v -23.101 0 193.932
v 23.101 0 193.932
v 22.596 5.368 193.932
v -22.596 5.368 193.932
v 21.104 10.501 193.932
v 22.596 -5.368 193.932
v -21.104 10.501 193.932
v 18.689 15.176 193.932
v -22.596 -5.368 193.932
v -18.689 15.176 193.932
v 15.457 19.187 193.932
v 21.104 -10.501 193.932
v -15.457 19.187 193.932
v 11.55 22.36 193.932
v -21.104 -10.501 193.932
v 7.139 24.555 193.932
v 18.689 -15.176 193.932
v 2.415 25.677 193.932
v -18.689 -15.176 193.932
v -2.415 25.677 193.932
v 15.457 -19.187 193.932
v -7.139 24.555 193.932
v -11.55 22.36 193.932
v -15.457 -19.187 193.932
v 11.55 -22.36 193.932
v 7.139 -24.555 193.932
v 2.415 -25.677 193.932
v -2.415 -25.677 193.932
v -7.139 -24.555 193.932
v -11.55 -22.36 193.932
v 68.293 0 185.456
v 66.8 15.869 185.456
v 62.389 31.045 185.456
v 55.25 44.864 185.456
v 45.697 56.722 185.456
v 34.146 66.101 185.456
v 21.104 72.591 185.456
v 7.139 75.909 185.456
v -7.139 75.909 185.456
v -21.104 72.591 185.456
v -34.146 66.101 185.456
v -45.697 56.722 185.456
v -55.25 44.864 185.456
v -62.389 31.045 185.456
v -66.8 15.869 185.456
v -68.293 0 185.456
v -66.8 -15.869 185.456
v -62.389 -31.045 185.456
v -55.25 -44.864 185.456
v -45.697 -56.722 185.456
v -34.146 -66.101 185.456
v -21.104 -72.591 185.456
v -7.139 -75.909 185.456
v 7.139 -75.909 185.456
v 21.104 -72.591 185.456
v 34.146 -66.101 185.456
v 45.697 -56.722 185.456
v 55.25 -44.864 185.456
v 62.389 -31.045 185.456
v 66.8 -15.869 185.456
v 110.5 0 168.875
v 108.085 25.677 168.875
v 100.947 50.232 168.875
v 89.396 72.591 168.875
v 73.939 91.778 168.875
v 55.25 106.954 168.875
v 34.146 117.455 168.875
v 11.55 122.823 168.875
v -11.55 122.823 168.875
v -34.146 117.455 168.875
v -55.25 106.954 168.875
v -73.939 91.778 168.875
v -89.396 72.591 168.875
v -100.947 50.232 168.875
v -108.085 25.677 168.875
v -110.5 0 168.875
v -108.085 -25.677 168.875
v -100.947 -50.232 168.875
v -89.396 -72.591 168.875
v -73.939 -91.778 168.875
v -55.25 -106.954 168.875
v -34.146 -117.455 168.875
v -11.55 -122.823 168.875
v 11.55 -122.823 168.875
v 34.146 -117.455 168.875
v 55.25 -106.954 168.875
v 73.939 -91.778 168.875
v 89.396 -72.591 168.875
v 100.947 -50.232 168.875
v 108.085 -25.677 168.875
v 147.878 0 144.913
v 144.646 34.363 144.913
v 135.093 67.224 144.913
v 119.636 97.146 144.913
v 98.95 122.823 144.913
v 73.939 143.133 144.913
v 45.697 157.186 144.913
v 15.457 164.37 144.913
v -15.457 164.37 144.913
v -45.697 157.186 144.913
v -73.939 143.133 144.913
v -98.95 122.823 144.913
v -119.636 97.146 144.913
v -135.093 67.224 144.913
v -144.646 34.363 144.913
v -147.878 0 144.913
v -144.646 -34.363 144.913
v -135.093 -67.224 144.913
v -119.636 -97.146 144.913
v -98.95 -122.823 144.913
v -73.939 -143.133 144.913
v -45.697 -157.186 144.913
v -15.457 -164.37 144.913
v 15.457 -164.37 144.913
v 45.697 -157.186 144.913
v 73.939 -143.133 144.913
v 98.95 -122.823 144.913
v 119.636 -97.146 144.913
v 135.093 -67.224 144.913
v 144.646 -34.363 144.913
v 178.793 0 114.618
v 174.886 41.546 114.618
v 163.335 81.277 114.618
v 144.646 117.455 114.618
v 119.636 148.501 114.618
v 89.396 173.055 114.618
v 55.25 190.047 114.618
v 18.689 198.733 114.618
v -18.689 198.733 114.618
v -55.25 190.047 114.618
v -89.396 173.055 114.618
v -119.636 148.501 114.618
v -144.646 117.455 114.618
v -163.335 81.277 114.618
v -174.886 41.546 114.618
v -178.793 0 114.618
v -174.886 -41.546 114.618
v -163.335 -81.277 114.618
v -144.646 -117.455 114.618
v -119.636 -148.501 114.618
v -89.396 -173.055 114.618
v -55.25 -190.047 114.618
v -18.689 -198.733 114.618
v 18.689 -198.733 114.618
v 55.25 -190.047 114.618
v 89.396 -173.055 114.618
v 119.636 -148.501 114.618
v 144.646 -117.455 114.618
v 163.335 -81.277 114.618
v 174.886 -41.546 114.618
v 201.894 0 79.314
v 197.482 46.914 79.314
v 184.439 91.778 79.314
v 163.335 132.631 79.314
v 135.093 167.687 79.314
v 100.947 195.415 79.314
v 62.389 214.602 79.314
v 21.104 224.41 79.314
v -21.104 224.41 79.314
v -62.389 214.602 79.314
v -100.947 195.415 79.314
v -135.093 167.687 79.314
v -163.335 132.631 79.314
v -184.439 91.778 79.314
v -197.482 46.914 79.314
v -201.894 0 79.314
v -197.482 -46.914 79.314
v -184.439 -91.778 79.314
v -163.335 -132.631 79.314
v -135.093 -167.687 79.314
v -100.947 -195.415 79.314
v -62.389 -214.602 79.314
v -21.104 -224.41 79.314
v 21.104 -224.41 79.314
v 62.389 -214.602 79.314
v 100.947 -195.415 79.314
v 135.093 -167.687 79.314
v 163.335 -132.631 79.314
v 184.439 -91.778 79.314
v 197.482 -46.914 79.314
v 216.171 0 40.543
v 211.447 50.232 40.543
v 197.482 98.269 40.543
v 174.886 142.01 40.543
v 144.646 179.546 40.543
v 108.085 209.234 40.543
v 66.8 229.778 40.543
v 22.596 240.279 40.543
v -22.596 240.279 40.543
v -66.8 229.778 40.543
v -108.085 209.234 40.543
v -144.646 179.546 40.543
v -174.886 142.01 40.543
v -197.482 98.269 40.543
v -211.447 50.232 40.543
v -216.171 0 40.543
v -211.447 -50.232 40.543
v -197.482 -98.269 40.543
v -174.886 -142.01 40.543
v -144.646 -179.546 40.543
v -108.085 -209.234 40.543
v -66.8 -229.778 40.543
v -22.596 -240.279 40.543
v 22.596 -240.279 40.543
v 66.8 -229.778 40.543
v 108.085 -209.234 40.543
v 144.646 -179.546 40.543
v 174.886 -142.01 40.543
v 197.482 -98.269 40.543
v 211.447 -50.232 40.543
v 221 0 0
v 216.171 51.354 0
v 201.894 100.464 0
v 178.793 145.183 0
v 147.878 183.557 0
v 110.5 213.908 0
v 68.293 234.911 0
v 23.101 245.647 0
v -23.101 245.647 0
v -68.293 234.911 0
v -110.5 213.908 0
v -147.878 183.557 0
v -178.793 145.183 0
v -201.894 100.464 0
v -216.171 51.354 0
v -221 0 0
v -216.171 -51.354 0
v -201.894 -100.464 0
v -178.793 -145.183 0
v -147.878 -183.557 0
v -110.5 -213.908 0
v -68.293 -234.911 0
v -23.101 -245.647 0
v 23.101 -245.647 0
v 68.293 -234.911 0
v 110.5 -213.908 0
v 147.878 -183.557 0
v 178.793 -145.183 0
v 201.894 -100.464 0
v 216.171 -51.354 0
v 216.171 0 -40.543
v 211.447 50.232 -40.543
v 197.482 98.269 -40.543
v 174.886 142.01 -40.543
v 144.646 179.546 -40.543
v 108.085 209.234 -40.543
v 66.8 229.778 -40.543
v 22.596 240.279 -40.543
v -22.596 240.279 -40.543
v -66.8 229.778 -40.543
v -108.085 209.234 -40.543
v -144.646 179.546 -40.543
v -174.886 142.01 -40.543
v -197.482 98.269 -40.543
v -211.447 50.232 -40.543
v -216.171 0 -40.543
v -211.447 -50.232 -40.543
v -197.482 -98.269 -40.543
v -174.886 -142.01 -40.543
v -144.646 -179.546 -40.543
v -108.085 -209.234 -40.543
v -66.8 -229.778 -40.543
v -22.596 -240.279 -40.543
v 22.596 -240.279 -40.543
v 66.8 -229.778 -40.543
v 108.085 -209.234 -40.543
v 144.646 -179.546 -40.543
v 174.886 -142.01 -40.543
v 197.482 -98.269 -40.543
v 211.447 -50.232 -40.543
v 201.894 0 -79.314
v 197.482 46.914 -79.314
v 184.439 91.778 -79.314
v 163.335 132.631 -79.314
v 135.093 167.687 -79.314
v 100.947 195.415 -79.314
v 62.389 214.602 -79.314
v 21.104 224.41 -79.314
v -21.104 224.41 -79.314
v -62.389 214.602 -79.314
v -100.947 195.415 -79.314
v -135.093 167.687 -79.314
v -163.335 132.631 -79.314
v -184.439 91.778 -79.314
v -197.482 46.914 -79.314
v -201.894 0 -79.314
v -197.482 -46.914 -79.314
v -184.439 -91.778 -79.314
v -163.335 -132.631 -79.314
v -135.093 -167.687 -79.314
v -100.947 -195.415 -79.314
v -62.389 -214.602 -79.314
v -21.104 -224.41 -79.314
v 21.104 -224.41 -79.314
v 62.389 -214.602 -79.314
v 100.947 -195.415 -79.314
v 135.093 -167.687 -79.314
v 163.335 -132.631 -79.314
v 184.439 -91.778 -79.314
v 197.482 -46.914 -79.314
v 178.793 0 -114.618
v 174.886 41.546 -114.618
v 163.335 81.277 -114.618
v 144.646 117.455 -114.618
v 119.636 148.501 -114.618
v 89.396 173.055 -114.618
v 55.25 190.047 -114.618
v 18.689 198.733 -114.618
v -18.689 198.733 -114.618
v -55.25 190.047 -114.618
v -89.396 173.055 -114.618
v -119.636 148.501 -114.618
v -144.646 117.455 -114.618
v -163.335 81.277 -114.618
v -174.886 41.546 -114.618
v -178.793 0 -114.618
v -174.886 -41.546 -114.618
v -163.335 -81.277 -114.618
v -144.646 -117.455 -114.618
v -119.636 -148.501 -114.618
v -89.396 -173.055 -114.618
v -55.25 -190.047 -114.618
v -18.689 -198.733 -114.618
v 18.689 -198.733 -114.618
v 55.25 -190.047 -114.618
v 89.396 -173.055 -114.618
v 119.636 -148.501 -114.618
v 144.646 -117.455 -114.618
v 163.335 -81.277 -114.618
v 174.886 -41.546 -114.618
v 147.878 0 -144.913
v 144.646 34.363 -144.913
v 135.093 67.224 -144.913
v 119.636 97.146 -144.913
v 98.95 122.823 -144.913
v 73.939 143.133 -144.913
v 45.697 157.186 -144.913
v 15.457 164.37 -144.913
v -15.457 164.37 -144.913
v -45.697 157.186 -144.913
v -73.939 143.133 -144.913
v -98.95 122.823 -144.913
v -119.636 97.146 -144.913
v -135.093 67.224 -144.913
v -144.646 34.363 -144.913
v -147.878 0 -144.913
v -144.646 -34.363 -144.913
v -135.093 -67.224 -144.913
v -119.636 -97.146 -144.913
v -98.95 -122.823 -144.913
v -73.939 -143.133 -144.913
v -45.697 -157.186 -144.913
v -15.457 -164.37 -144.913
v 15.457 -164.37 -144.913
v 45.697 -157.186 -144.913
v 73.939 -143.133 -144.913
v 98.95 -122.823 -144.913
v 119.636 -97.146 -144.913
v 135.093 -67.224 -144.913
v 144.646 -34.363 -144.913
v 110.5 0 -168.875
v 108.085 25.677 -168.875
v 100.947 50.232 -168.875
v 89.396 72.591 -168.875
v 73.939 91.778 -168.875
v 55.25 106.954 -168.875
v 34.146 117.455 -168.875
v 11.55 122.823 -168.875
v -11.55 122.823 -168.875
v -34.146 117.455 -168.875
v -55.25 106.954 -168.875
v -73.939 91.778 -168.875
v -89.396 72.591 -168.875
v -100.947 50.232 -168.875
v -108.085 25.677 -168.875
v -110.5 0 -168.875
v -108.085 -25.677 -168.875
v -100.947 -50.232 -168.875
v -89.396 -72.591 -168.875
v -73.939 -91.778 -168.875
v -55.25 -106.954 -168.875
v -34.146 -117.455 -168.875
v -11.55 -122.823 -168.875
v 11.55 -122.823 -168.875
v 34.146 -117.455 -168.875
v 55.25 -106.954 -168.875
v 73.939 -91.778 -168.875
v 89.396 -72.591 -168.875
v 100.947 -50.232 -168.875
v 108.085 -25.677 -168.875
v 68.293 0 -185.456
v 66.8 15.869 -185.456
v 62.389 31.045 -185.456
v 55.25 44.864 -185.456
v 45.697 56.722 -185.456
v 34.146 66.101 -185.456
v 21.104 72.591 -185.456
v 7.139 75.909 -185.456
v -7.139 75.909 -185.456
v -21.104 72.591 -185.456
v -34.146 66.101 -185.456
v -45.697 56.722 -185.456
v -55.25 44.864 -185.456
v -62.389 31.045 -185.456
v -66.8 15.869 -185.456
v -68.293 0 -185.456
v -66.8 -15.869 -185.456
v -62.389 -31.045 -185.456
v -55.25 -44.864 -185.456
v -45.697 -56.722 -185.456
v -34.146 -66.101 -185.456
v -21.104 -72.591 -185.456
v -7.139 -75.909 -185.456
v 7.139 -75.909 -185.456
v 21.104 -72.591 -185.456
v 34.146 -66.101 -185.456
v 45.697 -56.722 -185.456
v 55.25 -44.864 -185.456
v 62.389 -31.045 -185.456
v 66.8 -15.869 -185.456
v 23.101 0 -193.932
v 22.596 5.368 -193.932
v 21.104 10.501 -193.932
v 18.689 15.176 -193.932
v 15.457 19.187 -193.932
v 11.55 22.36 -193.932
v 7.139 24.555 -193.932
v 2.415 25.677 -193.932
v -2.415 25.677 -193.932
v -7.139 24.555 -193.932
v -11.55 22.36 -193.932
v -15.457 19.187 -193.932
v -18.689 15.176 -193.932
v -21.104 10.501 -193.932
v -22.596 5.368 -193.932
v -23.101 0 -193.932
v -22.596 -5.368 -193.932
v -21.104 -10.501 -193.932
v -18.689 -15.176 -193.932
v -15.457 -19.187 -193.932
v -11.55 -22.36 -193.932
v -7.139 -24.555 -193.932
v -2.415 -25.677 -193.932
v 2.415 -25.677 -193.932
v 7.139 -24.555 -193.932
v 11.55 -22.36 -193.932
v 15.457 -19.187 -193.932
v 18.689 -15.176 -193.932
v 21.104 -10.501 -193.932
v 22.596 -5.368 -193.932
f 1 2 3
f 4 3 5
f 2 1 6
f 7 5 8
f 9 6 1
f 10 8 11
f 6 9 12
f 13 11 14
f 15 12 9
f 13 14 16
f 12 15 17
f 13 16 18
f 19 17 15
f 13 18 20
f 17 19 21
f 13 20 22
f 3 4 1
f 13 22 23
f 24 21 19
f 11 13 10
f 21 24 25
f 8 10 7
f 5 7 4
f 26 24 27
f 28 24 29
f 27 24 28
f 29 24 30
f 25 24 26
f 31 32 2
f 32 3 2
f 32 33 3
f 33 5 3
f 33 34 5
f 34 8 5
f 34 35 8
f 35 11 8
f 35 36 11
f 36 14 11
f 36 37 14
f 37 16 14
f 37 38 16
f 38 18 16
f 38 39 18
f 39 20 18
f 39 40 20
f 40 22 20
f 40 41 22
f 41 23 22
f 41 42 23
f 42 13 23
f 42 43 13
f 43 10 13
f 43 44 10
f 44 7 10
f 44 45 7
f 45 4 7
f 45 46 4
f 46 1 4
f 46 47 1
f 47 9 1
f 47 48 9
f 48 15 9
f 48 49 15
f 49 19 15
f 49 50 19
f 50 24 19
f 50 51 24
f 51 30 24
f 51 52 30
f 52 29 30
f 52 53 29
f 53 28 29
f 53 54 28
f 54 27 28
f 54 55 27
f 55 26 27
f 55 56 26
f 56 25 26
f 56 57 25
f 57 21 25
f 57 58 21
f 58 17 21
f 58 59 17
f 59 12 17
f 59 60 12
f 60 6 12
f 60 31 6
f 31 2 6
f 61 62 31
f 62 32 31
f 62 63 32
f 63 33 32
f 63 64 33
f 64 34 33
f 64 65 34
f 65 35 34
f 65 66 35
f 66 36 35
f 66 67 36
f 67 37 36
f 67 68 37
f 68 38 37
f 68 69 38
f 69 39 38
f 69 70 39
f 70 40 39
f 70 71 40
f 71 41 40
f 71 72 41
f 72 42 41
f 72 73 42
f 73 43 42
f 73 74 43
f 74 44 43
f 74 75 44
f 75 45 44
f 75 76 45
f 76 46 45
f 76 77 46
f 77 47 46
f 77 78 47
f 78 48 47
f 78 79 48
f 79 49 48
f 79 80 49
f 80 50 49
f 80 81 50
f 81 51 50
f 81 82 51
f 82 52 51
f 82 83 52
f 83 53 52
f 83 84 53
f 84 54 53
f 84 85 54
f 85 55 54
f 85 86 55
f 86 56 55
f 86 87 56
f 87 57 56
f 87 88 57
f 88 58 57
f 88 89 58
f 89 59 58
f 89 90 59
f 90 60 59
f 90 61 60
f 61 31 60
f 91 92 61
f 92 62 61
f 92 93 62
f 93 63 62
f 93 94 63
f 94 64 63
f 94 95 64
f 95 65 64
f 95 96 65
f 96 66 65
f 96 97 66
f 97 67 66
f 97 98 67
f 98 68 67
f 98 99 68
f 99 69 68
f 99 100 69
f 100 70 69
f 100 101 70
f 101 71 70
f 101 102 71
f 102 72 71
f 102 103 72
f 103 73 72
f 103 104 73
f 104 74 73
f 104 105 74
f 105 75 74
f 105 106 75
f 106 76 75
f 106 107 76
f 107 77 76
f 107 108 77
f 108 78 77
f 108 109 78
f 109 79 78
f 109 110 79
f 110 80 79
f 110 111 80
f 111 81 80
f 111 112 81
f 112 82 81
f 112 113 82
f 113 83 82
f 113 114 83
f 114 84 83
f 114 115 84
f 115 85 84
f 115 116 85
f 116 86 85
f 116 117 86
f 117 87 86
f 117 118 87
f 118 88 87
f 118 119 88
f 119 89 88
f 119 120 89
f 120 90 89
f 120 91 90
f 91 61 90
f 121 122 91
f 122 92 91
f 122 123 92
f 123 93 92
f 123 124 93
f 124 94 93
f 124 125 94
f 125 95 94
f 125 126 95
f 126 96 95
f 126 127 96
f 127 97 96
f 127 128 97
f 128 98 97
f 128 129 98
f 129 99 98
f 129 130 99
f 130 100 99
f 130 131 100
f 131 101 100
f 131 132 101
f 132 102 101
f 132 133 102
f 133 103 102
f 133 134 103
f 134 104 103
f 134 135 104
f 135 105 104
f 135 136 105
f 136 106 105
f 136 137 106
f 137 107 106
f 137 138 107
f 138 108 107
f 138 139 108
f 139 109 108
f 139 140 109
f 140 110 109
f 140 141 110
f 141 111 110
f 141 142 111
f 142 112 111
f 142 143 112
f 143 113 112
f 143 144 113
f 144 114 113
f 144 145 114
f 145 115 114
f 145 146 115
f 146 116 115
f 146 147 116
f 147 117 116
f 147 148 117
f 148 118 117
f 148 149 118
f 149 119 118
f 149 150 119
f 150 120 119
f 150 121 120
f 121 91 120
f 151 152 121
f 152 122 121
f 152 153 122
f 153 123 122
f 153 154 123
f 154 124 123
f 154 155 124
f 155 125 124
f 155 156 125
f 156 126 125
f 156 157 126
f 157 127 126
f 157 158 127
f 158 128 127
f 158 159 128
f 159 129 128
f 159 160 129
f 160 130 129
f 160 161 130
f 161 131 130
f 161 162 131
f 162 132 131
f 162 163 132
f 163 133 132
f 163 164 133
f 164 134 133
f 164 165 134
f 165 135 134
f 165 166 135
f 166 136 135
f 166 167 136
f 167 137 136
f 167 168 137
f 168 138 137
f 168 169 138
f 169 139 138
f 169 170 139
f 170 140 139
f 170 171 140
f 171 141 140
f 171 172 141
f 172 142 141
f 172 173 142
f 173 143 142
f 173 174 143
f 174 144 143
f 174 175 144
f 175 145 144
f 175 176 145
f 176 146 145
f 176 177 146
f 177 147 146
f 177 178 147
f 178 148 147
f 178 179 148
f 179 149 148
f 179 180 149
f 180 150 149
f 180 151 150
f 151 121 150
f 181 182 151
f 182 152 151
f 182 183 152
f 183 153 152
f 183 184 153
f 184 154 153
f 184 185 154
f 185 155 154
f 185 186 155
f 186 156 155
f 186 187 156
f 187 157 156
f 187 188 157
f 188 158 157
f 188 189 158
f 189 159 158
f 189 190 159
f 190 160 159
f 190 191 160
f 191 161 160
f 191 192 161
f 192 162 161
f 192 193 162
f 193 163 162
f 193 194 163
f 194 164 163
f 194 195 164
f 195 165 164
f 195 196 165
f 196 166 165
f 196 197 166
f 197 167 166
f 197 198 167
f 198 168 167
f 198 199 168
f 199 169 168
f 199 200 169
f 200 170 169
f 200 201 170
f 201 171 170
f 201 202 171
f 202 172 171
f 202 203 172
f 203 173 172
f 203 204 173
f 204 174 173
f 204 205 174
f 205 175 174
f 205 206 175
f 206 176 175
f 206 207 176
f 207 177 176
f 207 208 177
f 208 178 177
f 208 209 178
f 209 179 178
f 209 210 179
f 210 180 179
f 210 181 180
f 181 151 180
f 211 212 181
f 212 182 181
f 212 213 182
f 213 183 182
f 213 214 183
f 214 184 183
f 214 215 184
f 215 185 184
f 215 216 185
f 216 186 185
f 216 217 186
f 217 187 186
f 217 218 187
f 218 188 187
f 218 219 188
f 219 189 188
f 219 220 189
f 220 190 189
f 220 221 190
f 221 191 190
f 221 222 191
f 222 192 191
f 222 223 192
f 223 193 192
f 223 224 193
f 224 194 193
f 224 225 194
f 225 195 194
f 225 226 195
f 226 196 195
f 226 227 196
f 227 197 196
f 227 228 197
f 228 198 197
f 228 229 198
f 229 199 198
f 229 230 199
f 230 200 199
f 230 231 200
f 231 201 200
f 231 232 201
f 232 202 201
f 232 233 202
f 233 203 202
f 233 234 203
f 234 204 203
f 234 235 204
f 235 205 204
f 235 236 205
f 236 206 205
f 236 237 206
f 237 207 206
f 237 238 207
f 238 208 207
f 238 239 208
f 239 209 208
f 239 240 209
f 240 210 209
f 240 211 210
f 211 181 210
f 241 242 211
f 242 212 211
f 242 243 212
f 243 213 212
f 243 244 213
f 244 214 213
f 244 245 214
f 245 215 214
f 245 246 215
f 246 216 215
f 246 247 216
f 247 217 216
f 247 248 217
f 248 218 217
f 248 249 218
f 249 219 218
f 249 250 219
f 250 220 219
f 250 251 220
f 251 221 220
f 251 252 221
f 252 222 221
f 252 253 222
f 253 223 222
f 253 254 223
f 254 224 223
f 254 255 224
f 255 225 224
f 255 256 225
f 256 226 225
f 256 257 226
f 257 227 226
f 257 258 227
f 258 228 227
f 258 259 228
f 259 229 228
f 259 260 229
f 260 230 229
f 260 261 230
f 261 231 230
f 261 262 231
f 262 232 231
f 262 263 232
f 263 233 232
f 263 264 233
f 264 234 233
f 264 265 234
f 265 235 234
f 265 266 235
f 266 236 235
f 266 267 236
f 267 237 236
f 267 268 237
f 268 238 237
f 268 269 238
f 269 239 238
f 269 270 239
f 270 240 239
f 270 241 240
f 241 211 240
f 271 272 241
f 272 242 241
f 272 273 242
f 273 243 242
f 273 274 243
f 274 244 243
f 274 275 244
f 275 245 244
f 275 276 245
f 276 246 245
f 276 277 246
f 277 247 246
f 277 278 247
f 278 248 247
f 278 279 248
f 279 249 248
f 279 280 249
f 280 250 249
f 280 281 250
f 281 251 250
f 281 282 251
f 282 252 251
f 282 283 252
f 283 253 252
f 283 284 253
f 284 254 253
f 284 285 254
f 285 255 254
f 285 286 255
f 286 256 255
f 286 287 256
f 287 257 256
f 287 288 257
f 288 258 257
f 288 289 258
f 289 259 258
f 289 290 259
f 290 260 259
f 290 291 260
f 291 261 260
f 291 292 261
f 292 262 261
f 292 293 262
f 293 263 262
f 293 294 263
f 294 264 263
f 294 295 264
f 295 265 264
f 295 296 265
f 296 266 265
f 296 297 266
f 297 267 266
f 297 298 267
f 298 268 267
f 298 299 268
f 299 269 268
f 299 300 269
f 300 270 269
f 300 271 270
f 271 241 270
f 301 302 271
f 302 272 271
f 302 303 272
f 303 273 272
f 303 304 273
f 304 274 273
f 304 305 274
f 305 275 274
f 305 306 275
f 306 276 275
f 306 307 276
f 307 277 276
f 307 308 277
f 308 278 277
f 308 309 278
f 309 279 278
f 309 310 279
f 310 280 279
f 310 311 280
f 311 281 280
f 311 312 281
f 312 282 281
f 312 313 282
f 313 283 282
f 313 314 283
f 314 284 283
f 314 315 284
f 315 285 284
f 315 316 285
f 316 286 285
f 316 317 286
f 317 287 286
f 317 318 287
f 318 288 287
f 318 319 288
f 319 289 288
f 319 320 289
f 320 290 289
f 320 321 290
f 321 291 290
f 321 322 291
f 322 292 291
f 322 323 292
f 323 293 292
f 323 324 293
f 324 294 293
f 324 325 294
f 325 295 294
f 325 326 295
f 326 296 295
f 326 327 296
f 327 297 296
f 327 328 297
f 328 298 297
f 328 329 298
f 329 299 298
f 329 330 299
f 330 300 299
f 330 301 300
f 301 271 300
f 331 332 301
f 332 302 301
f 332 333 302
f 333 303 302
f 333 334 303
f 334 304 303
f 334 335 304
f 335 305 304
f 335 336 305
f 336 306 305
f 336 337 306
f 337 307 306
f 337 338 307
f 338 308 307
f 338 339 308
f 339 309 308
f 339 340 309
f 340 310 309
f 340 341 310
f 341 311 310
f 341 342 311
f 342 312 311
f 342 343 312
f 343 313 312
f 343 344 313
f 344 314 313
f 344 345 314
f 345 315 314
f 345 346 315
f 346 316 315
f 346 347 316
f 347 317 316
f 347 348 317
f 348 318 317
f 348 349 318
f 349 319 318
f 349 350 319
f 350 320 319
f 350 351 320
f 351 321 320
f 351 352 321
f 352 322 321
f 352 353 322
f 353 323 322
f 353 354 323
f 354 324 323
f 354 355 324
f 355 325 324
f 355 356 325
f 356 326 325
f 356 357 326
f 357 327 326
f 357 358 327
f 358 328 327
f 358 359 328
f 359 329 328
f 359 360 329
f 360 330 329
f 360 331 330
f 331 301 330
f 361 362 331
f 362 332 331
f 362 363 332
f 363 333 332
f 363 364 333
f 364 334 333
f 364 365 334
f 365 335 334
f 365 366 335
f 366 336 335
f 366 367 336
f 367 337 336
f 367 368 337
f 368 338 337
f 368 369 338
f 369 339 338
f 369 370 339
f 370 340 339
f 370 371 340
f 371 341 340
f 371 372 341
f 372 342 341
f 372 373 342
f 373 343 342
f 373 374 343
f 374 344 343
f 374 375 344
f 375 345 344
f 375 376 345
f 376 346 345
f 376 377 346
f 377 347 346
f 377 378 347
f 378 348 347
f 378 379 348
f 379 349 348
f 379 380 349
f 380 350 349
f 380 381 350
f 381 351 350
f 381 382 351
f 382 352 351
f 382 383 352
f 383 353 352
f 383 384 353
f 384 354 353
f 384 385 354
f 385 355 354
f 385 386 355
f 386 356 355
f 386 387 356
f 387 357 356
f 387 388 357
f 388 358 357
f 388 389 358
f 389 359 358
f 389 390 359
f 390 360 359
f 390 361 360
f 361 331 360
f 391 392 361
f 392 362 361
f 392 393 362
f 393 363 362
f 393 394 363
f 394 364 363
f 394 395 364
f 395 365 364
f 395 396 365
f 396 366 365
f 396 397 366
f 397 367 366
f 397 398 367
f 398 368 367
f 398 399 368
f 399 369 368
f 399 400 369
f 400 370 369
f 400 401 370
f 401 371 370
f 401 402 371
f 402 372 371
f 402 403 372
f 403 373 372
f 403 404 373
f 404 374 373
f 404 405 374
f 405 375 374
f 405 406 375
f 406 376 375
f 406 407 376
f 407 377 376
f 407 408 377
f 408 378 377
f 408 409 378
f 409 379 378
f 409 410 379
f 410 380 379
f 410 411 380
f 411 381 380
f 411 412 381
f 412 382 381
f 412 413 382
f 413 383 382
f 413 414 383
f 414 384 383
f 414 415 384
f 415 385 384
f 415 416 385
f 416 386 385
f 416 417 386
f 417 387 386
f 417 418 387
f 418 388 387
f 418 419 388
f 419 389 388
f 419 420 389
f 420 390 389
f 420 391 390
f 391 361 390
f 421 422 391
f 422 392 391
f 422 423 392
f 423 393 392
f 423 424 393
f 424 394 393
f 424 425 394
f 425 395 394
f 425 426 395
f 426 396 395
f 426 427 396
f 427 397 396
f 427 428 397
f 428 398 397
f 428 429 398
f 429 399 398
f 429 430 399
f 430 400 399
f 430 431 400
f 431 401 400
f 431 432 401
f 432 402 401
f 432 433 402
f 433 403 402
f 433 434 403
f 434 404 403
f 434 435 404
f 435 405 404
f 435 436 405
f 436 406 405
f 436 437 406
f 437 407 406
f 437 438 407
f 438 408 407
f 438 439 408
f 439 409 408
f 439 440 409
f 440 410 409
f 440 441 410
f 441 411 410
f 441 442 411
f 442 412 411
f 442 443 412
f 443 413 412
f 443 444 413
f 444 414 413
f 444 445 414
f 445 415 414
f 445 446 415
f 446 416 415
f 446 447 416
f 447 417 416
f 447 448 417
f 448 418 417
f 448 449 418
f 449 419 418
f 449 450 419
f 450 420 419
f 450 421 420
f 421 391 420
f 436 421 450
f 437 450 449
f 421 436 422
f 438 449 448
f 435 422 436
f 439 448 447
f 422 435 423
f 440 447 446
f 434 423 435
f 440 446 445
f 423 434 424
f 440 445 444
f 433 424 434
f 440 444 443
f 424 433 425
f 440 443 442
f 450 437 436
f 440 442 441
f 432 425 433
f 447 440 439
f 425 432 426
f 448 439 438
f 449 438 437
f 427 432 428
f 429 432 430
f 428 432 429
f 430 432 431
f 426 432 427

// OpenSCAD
// Generated by SolidPython 1.0.1 on 2020-07-29 00:46:53


scale(v = [17, 19, 15]) {
	sphere(r = 13);
}
/***********************************************
*********      SolidPython code:      **********
************************************************
 
# import packages: SolidPython
from solid import *
from solid.utils import *
from itertools import chain, combinations, permutations


class Resize:

    def __init__(self, scad_file):
        self.scad_file = scad_file
        #self.scad_file = import_scad(scad_file)
        # cone/cylinder param:
        self.r1 = 0
        self.r2 = 0
        self.h = 0
        # rectangular prism param:
        self.w = 0
        self.l = 0
        # ellipse param:
        self.r = 0

    # import OpenScad code (file name corresponds to shape)


    # classify shape + parameters
    def assign(self, param1, param2, param3):
        if self.scad_file == 'cone.scad':
            self.r1 = param1
            self.r2 = param2
            self.h = param3
        elif self.scad_file == 'cylinder.scad':
            self.r1 = param1
            self.r2 = param2
            self.h = param3
        elif self.scad_file == 'rectangularPrism.scad':
            self.h = param1
            self.l = param2
            self.w = param3
        else:
            self.r = param1
            self.h = param2

    # resize parameters
    def iterate(self):
        x = range(3, 20, 2)
        i = 1
        if self.scad_file == 'cone.scad':
            tempList = list(permutations(x, 2))
            for temp in tempList:
                param1 = temp[0]
                param2 = temp[1]
                filepath = 'produced_scad_files/' + 'cone' + str(param1) + '_' + str(param2) + '_' + '.scad'
                scad_render_to_file(cylinder(h=param1, r1=param2, r2=0), filepath)

        elif self.scad_file == 'cylinder.scad':
            tempList = list(permutations(x, 3))
            for temp in tempList:
                param1 = temp[0]
                param2 = temp[1]
                filepath = 'produced_scad_files/' + 'cylinder' + str(param1) + '_' + str(param2) + '_' + '.scad'
                scad_render_to_file(cylinder(h=param1, r1=param2, r2=param2), filepath)

        elif self.scad_file == 'rectangularPrism.scad':
            tempList = list(permutations(x, 3))
            for temp in tempList:
                param1 = temp[0]
                param2 = temp[1]
                param3 = temp[2]
                filepath = 'produced_scad_files/' + 'rectangularPrism' + str(param1) + '_' + str(param2) + '_' + str(
                    param3) + '.scad'
                scad_render_to_file(cube(size=(param1, param2, param3)), filepath)

        elif self.scad_file == 'ellipse.scad':
            tempList = list(permutations(x, 4))
            for temp in tempList:
                param1 = temp[0]
                param2 = temp[1]
                param3 = temp[2]
                param4 = temp[3]
                filepath = 'produced_scad_files/' + 'ellipse' + str(param1) + '_' + str(param2) + '_' + str(param3) + '_' + str(param4) + '.scad'
                scad_render_to_file(scale([param1, param2, param3])(sphere(r=param4)), filepath)

    def render_to_scadfile(self):
        scad_render_to_file(scad, 'example.scad') 
 
************************************************/
